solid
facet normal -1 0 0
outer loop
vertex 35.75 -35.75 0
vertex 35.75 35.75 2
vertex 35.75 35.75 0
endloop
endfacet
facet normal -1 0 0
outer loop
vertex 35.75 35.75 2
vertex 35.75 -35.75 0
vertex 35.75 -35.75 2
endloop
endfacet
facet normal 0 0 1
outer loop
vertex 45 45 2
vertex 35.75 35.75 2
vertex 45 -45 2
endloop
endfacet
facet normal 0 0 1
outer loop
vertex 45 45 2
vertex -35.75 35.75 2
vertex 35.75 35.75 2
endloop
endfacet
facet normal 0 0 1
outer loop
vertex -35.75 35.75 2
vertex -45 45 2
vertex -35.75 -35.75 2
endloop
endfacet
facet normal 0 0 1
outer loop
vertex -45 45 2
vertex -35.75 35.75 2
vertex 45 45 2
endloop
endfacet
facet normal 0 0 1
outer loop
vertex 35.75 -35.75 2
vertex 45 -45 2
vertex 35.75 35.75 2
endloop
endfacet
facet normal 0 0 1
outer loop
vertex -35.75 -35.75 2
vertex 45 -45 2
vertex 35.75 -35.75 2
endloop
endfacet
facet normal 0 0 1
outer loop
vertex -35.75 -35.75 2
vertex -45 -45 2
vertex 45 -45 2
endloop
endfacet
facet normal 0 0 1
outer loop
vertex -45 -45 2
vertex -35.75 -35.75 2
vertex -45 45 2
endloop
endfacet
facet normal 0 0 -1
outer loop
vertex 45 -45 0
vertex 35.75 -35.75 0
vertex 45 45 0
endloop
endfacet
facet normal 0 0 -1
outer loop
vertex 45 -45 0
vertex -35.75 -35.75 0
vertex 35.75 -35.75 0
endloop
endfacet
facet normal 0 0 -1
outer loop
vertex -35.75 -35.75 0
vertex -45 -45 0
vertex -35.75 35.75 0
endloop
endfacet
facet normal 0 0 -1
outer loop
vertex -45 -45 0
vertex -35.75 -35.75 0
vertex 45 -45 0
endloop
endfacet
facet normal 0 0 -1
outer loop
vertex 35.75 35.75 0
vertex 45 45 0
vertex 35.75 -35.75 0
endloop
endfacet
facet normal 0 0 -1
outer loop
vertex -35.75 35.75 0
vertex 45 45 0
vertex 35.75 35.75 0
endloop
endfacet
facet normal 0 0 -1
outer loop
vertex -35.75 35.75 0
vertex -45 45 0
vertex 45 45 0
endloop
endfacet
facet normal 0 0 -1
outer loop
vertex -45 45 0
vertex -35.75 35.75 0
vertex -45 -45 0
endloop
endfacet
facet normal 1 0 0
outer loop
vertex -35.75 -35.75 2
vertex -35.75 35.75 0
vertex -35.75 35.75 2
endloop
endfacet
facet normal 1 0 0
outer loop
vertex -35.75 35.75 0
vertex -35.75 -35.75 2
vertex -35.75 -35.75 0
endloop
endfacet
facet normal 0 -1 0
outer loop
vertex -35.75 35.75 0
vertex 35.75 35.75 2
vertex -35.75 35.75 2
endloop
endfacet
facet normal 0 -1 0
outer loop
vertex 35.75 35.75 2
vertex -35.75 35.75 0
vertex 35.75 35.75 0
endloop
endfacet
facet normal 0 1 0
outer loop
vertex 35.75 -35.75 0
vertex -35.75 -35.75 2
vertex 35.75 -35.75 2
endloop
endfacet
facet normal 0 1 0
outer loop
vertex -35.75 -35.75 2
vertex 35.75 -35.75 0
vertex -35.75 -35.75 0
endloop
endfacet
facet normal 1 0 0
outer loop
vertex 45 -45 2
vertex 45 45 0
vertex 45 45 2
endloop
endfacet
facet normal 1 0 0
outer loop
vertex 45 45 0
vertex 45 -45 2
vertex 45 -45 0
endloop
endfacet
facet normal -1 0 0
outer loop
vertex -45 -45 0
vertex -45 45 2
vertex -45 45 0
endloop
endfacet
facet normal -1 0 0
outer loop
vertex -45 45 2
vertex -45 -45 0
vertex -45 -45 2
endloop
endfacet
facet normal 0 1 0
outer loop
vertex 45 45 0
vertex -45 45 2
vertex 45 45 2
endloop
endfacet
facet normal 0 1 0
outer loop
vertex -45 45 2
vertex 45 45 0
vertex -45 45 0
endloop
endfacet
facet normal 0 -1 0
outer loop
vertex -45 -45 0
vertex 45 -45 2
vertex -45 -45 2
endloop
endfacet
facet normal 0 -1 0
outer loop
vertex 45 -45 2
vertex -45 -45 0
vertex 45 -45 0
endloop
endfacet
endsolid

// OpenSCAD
// Built by bench/smallmodels/features/compiler.py from a list of features.
$fn = 64;
difference() {
  union() {
    translate([0, 0, 0]) translate([-45, -45, 0]) cube([90, 90, 2]);
  }
  union() {
    translate([0, 0, 0]) rotate([0, 0, 0]) translate([-35.75, -35.75, 0]) cube([71.5, 71.5, 2]);
    translate([-45, 0, 36]) rotate([0, 0, 0]) translate([-6, -4, 0]) cube([12, 8, 2]);
  }
}
